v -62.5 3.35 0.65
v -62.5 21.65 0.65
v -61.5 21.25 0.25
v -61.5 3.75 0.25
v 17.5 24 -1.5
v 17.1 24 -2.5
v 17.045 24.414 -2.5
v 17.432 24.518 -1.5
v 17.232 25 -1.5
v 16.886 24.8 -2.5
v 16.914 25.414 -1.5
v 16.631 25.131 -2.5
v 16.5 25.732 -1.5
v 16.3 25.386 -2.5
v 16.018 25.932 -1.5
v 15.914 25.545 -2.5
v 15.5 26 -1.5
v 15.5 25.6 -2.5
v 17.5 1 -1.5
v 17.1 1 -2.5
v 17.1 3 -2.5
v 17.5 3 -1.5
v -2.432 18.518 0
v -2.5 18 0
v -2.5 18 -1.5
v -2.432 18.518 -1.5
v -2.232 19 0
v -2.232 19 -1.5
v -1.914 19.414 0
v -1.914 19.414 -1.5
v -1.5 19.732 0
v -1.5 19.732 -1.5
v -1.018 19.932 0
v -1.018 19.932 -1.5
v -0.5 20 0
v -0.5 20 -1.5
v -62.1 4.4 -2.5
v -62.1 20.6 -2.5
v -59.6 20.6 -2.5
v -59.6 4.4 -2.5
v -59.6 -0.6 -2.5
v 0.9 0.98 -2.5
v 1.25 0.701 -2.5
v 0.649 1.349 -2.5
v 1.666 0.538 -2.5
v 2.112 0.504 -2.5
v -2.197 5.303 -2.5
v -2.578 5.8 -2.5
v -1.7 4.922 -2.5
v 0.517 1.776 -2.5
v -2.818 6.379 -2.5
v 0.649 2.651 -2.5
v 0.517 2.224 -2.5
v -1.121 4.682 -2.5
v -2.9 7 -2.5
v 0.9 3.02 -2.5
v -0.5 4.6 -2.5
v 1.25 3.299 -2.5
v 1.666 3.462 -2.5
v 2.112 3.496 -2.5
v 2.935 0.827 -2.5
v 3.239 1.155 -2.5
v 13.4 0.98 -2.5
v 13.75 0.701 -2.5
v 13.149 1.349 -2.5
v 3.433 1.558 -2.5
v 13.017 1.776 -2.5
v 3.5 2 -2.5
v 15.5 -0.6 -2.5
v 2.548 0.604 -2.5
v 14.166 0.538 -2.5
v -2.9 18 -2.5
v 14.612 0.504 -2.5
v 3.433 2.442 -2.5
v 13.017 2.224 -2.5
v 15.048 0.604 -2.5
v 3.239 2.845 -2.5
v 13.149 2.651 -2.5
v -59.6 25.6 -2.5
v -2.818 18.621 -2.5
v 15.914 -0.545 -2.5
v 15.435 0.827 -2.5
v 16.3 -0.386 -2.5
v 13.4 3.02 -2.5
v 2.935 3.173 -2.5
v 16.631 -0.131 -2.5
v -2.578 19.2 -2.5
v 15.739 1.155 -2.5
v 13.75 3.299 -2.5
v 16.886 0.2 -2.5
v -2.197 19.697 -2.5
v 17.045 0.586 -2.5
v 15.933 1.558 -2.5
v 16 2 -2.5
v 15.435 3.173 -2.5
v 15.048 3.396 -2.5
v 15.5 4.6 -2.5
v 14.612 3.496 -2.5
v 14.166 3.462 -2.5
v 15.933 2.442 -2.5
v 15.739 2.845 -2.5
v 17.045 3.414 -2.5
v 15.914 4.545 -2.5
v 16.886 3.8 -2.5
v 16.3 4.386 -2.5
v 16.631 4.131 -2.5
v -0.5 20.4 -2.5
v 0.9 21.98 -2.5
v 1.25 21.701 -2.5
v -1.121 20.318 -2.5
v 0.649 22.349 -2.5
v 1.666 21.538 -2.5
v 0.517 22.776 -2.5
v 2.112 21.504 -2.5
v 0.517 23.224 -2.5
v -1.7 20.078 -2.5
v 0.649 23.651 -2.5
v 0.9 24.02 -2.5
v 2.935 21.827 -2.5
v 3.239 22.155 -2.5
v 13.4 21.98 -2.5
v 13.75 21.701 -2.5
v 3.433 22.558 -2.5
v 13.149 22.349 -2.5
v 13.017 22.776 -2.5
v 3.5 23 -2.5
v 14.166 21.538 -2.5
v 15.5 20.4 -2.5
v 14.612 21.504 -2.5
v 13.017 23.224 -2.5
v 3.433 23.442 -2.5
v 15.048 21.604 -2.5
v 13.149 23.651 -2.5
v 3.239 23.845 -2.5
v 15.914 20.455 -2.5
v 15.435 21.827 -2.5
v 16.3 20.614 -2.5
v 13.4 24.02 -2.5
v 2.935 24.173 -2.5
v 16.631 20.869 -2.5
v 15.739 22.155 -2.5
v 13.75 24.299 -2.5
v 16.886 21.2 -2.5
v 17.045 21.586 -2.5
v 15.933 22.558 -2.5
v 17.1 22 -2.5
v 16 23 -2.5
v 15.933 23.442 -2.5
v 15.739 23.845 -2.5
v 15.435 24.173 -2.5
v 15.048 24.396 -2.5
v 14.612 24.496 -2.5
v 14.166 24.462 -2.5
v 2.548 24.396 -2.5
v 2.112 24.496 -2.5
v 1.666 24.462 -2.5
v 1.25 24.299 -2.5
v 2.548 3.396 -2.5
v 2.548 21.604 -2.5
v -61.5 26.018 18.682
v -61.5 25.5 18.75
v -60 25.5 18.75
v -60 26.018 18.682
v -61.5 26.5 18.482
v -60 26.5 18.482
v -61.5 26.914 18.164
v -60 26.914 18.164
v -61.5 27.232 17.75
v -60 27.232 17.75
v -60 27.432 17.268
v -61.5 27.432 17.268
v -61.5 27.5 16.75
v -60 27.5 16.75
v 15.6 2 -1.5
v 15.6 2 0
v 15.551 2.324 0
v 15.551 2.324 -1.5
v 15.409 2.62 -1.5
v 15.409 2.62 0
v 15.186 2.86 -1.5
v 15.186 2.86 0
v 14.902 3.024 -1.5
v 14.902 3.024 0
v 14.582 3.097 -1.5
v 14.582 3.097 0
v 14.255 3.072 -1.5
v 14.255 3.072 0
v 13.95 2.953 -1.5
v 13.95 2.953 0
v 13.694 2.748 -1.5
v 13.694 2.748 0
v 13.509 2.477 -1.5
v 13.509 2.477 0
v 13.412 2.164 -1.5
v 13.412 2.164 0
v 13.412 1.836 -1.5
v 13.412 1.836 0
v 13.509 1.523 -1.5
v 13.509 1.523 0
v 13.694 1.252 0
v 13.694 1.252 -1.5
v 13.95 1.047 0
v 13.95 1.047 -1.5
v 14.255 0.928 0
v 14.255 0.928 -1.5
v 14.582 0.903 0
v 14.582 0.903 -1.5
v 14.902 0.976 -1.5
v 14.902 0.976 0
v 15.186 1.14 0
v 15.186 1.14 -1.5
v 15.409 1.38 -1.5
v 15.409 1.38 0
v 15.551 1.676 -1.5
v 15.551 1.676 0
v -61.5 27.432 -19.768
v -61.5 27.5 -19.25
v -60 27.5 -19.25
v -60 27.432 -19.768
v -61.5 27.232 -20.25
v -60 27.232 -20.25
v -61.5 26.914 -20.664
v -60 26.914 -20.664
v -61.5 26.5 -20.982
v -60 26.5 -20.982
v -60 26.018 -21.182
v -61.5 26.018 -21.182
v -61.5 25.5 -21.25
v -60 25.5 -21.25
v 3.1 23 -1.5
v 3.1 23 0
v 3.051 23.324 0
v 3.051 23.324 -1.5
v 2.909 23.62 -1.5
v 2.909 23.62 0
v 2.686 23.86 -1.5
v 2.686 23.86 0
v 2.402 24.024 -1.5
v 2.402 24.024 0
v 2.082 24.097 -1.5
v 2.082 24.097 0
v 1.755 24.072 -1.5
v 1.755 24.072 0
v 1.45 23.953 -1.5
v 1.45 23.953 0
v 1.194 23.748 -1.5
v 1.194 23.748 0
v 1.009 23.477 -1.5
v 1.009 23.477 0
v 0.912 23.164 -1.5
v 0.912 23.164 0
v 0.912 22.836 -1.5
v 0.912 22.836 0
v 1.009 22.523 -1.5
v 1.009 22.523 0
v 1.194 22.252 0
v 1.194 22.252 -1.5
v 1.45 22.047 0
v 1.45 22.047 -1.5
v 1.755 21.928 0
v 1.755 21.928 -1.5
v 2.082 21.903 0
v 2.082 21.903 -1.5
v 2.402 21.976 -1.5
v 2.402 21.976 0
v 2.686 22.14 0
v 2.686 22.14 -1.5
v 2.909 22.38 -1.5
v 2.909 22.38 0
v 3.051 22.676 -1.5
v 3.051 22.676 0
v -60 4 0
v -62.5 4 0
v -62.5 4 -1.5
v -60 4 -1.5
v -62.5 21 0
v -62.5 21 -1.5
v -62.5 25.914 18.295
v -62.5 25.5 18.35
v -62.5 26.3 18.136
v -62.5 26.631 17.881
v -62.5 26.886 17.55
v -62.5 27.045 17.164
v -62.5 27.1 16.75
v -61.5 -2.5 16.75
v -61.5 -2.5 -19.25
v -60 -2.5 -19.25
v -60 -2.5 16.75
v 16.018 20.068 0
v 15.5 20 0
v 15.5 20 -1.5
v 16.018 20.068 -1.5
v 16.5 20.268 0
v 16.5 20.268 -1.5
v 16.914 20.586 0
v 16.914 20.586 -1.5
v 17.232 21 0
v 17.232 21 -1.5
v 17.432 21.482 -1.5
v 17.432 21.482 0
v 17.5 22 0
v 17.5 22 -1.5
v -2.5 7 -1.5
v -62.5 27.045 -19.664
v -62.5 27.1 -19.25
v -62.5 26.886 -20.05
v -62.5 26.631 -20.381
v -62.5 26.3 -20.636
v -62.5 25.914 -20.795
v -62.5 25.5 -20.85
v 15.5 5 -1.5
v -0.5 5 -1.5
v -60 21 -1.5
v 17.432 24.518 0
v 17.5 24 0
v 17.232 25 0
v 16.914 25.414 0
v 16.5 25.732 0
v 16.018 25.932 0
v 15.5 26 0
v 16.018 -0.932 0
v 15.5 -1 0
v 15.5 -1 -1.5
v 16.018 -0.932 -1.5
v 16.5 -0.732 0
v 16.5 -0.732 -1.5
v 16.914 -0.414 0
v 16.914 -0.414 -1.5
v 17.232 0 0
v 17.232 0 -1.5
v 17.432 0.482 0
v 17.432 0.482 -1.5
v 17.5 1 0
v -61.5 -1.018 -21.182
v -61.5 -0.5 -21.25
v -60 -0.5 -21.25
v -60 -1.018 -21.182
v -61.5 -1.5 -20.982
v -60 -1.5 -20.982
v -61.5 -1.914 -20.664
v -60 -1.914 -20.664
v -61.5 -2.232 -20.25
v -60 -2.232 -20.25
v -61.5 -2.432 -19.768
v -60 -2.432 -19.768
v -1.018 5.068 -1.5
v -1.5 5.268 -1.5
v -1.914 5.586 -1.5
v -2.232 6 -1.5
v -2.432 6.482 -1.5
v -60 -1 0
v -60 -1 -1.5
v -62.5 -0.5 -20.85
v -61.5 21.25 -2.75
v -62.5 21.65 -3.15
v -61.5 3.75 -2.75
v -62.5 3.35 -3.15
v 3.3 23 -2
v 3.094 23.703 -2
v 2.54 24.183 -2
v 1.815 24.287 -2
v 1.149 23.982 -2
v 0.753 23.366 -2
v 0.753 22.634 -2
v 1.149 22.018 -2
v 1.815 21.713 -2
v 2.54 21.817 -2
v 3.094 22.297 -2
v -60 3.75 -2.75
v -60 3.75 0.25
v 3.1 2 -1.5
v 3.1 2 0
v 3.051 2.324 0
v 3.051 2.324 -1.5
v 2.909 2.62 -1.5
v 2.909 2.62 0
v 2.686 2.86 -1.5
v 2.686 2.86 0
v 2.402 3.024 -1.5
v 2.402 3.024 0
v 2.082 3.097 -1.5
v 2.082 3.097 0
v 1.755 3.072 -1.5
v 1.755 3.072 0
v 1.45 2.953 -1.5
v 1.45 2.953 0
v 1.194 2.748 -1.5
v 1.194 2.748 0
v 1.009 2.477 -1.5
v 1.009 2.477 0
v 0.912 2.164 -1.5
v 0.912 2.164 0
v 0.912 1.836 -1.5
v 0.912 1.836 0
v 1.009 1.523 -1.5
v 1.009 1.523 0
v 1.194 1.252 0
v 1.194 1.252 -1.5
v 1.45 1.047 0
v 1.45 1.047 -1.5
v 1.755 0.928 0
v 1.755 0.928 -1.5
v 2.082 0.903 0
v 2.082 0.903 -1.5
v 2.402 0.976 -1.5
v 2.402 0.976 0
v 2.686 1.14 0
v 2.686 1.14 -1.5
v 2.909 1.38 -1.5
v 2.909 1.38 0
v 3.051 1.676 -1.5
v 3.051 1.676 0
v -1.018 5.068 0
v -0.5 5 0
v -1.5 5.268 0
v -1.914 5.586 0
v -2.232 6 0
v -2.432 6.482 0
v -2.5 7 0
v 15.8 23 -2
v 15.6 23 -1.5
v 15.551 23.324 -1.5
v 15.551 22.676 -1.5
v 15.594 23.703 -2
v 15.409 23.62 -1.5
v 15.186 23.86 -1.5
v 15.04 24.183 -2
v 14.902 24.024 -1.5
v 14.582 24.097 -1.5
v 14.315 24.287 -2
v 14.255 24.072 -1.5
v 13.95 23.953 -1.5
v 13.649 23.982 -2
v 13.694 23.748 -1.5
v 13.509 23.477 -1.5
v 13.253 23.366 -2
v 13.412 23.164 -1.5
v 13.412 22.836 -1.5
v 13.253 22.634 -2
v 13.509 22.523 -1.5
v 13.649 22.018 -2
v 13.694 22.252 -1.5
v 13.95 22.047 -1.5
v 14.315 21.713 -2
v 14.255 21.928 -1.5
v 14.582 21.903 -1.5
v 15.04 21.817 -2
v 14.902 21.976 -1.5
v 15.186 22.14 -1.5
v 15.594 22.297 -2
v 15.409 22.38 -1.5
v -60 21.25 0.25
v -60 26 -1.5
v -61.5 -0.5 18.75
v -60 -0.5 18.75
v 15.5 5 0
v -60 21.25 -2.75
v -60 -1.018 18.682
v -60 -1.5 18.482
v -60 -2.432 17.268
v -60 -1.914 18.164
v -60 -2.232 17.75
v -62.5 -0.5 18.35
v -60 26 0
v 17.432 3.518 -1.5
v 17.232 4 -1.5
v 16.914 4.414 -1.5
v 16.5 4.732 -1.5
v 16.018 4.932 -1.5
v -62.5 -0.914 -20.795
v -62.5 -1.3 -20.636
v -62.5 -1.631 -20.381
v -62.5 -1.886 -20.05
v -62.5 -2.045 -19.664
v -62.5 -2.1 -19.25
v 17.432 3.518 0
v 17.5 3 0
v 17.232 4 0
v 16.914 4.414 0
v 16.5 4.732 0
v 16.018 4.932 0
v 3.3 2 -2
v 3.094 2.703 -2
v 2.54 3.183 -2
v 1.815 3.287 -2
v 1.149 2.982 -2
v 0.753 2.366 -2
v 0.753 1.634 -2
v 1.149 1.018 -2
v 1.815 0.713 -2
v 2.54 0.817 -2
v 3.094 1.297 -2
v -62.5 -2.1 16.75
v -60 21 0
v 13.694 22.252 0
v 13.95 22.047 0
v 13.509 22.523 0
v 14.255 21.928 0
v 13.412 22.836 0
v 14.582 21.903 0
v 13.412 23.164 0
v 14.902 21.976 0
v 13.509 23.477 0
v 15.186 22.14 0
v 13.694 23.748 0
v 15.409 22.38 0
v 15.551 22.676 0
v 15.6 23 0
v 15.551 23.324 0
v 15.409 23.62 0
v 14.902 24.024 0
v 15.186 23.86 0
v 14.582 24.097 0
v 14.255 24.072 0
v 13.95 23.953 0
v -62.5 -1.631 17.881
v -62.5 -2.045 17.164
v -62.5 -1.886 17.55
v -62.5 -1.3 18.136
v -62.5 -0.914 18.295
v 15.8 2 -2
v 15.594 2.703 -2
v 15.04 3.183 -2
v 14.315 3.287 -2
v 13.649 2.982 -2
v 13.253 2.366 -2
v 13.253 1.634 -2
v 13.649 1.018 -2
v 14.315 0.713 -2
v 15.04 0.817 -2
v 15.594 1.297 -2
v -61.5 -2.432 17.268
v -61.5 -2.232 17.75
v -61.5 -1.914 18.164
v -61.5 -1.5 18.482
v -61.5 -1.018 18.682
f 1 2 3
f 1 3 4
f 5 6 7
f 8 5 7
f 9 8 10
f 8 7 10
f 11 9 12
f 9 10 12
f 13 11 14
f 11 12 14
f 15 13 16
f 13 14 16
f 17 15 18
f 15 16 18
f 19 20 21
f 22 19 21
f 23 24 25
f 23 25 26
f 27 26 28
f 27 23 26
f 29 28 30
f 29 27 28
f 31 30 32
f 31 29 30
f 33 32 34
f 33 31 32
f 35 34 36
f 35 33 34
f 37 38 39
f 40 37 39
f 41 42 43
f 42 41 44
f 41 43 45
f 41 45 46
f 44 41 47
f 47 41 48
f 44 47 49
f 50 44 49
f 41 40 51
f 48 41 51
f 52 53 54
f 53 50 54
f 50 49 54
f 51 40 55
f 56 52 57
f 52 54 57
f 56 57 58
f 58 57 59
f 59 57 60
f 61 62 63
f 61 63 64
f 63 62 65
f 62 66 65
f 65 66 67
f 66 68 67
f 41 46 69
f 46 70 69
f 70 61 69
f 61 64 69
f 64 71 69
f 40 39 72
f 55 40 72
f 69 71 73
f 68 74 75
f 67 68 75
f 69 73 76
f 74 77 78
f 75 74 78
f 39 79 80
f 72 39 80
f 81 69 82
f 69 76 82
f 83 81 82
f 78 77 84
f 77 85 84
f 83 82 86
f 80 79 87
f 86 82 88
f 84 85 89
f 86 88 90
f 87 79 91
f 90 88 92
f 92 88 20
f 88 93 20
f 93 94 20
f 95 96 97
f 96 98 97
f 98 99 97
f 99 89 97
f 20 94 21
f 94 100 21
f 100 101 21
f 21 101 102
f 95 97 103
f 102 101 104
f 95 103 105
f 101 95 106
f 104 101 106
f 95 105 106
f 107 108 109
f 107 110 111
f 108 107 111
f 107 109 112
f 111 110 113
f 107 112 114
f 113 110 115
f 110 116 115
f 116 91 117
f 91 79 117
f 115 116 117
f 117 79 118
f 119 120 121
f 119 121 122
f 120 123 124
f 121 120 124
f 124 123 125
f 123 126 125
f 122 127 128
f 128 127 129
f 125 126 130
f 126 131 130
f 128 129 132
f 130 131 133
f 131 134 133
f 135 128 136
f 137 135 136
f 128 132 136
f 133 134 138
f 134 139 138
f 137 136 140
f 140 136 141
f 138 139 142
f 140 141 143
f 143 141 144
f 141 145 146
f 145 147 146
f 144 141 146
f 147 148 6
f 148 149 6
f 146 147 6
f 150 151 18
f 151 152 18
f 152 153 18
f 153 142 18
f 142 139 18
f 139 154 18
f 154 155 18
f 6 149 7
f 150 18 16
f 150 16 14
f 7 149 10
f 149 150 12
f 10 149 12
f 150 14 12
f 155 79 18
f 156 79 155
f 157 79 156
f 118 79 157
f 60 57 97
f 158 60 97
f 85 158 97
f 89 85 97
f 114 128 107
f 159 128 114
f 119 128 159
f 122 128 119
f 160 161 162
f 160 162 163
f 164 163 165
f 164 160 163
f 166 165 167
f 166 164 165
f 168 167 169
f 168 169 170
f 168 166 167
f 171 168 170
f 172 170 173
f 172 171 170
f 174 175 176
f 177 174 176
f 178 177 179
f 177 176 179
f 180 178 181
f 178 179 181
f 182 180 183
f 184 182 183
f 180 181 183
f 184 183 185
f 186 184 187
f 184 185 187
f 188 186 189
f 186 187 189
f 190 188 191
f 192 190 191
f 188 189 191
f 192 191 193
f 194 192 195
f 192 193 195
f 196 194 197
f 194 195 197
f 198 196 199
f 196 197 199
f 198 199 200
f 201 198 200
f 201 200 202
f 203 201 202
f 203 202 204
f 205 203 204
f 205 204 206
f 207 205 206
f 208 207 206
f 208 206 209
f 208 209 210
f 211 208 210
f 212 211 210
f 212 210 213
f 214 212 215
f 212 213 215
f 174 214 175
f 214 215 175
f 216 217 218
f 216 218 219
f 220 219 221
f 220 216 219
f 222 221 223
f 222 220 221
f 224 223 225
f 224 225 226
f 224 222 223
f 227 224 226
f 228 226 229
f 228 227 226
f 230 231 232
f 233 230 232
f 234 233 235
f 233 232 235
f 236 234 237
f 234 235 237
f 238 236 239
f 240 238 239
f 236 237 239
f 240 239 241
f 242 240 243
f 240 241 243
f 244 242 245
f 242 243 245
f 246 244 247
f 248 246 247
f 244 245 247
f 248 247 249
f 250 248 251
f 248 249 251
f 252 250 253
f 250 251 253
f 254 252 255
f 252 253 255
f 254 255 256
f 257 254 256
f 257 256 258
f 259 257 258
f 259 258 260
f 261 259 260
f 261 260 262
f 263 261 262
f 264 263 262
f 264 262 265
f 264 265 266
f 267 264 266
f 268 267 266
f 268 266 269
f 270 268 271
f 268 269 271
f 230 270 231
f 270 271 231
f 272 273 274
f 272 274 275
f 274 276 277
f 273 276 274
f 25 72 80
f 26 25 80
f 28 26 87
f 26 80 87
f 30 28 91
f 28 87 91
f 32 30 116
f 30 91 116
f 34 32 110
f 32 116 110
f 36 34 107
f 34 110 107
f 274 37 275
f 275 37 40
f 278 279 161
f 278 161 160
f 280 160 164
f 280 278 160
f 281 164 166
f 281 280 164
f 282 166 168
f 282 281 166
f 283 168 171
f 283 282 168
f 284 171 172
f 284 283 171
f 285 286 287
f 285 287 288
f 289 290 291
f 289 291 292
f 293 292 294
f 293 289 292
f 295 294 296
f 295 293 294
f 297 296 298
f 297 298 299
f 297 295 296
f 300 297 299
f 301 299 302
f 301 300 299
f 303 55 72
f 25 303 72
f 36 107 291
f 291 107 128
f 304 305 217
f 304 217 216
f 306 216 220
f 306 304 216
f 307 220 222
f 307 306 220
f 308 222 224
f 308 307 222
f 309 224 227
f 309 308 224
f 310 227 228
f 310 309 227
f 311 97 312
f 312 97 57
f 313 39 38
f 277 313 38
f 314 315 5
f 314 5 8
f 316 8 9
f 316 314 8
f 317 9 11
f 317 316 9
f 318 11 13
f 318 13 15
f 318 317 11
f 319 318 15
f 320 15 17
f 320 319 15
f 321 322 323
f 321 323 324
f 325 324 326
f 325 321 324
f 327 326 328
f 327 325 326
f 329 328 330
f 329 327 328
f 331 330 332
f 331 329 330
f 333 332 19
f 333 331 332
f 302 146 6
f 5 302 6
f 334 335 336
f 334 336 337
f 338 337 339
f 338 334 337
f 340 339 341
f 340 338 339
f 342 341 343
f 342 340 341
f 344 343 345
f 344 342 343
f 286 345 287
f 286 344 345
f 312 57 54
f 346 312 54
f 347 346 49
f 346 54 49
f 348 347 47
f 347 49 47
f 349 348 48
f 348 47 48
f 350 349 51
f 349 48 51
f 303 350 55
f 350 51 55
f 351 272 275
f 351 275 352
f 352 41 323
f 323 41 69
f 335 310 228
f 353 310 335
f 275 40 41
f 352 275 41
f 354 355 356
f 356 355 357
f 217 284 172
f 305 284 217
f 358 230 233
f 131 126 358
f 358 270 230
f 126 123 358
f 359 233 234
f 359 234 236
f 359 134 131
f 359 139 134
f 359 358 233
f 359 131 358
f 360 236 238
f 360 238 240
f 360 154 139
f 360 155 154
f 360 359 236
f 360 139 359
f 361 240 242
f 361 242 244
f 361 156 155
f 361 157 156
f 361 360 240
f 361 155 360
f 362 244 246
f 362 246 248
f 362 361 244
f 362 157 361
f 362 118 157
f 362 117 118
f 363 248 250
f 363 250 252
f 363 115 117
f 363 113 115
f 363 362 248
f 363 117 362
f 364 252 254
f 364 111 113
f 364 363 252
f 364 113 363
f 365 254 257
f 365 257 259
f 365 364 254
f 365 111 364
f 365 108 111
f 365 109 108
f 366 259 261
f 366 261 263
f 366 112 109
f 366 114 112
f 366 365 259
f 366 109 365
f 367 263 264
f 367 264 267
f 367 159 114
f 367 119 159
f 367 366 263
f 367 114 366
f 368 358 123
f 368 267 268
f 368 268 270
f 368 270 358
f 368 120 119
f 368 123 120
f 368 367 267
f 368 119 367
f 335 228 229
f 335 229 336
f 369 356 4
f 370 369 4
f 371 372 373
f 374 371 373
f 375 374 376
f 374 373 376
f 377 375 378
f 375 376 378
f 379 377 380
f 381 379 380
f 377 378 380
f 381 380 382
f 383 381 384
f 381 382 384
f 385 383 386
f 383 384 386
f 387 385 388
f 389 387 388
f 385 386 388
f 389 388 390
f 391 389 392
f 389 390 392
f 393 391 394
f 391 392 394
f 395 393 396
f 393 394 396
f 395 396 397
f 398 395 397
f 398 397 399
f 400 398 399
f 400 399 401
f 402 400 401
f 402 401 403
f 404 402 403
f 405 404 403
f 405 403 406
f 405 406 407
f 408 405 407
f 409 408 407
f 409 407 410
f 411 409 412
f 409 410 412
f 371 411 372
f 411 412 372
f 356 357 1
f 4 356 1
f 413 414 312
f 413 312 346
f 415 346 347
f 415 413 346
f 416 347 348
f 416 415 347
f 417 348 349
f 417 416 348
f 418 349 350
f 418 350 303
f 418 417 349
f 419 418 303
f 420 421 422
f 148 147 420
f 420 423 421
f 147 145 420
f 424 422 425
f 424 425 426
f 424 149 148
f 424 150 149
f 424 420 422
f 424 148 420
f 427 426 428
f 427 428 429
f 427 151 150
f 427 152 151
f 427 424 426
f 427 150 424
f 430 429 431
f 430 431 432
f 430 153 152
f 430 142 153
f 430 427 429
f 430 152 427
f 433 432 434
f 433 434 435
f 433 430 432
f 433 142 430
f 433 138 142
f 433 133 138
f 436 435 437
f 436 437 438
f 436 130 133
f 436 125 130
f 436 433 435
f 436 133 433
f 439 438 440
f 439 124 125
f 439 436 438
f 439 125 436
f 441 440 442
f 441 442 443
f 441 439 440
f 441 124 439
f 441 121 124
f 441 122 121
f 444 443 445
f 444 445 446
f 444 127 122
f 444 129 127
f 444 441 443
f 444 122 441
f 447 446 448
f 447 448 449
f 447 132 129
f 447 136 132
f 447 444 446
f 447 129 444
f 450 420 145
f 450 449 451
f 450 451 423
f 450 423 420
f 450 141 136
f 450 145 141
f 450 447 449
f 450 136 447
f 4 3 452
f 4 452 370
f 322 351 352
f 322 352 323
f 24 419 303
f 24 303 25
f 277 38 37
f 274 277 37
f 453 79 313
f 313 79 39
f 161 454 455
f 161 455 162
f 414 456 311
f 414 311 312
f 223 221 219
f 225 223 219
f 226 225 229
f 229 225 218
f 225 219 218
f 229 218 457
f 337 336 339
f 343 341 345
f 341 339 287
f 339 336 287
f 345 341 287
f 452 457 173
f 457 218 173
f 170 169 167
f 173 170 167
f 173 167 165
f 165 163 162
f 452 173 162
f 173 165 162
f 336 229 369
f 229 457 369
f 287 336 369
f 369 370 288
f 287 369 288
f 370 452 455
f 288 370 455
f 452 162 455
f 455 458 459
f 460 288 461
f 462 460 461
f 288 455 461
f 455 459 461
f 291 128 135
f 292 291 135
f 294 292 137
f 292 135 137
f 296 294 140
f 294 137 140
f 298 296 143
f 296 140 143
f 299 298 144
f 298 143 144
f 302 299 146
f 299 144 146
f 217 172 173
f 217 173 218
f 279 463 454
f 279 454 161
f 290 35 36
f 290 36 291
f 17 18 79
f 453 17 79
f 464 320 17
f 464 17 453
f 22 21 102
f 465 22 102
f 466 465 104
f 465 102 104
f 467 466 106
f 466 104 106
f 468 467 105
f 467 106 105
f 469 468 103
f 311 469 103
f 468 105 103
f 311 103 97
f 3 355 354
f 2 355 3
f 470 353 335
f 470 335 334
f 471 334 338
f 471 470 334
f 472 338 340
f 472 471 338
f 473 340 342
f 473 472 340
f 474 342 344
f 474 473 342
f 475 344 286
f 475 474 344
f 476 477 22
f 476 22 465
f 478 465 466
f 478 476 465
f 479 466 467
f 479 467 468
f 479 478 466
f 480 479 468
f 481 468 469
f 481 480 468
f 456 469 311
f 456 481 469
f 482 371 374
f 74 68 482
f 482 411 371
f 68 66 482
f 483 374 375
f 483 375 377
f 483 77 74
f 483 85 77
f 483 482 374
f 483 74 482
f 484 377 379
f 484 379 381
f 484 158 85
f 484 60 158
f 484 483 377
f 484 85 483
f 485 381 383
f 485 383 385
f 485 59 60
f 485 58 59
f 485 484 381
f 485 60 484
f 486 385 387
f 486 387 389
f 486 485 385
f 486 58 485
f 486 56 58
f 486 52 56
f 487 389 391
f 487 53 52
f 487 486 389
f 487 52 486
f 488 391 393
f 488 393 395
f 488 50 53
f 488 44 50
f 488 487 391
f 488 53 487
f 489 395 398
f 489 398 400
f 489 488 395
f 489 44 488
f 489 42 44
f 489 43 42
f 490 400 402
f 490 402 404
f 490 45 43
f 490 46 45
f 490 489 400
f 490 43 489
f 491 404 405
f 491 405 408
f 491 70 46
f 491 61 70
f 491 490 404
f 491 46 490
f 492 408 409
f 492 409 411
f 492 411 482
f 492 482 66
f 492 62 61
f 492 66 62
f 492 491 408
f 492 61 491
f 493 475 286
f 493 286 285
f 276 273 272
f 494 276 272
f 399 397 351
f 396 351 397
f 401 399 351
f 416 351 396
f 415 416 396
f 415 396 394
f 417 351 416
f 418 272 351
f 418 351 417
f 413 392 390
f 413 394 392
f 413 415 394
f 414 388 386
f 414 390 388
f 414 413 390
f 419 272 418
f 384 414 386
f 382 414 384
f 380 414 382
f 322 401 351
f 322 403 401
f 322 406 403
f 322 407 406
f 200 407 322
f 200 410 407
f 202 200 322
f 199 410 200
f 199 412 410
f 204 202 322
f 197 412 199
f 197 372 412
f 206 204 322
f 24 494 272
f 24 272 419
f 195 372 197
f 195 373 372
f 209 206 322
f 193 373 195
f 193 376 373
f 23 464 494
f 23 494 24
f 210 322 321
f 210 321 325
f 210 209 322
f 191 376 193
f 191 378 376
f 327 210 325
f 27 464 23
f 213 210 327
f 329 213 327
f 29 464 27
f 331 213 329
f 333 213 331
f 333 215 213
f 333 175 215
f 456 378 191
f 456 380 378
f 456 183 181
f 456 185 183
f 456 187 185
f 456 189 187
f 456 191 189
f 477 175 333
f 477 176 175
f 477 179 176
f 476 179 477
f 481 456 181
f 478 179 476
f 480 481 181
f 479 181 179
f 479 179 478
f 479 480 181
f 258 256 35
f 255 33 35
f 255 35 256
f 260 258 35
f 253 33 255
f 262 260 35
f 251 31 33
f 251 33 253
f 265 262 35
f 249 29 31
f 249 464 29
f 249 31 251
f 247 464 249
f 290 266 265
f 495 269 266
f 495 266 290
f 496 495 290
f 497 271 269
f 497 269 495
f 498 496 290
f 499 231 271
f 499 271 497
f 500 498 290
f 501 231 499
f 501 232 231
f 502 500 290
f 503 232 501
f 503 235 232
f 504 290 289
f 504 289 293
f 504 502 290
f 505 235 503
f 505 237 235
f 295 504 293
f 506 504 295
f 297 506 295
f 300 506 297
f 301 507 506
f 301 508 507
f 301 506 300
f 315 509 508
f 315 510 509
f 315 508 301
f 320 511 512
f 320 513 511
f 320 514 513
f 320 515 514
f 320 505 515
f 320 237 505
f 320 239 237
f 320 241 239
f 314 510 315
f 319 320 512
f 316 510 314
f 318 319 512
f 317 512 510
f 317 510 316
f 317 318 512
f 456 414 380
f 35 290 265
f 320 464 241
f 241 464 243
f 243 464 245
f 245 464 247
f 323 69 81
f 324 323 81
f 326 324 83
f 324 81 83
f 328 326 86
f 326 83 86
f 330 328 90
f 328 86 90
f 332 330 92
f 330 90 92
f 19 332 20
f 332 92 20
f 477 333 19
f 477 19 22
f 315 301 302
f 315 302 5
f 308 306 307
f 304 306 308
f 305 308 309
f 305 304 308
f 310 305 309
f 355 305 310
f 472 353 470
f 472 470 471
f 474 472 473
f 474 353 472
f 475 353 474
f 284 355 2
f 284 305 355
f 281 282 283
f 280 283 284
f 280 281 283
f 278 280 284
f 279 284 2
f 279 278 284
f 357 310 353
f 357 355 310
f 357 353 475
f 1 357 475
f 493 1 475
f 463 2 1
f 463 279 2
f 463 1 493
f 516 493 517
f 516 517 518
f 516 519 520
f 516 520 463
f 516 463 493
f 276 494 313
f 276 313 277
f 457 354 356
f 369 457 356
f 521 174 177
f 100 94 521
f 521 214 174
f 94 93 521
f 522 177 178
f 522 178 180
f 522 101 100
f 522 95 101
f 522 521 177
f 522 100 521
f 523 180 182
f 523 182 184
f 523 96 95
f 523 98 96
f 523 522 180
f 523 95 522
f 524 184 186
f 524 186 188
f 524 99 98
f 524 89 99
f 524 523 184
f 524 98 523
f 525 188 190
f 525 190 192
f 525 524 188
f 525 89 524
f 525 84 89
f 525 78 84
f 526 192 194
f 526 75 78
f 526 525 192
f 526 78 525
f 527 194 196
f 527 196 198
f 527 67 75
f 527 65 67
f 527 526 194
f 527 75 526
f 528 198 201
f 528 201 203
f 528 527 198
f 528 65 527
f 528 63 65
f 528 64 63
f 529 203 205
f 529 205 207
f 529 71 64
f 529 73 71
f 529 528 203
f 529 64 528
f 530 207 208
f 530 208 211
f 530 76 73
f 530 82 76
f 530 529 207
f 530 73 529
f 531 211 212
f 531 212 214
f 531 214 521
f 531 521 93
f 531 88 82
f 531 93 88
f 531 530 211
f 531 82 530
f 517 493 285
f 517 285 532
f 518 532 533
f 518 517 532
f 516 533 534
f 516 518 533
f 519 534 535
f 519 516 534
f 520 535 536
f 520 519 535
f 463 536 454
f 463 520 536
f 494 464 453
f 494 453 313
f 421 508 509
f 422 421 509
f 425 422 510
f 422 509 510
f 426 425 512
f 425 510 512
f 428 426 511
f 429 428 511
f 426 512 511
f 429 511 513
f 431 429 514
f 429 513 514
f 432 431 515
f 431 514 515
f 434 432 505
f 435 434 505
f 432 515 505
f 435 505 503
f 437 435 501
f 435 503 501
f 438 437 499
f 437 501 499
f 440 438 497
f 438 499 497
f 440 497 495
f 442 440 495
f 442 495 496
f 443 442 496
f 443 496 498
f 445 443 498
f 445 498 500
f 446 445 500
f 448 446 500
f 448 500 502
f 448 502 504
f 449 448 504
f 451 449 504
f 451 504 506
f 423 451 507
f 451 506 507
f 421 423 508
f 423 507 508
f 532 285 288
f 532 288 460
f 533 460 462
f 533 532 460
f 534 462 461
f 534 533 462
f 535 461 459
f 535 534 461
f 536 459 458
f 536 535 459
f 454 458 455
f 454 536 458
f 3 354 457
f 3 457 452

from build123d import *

# Parameters (mm, degrees)
F0_R     = 1.1
F1_DEPTH = 2.5
F2_W     = 17.5
F2_H     = 3
F3_DEPTH = 2.5
F4_SIZE2 = 0.4
F4_SIZE  = 1
F5_SIZE2 = 0.4
F5_SIZE  = 1


with BuildPart() as f1:
    # F0 (on Top) → F1 (new body)
    with BuildSketch(Plane.XY):
        with BuildLine():
            Line((-60, 4), (-60, -1))
            Line((-60, -1), (15.5, -1))
            ThreePointArc((15.5, -1), (16.914214, -0.414214), (17.5, 1))
            Line((17.5, 1), (17.5, 3))
            ThreePointArc((17.5, 3), (16.914214, 4.414214), (15.5, 5))
            Line((15.5, 5), (-0.5, 5))
            ThreePointArc((-0.5, 5), (-1.914214, 5.585786), (-2.5, 7))
            Line((-2.5, 7), (-2.5, 18))
            ThreePointArc((-2.5, 18), (-1.914214, 19.414214), (-0.5, 20))
            Line((-0.5, 20), (15.5, 20))
            ThreePointArc((15.5, 20), (16.914214, 20.585786), (17.5, 22))
            Line((17.5, 22), (17.5, 24))
            ThreePointArc((17.5, 24), (16.914214, 25.414214), (15.5, 26))
            Line((15.5, 26), (-60, 26))
            Line((-60, 26), (-60, 21))
            Line((-60, 21), (-62.5, 21))
            Line((-62.5, 21), (-62.5, 4))
            Line((-62.5, 4), (-60, 4))
        make_face()
        with Locations((2, 2)):
            Circle(F0_R, mode=Mode.SUBTRACT)
        with Locations((14.5, 2)):
            Circle(F0_R, mode=Mode.SUBTRACT)
        with Locations((2, 23)):
            Circle(F0_R, mode=Mode.SUBTRACT)
        with Locations((14.5, 23)):
            Circle(F0_R, mode=Mode.SUBTRACT)
    extrude(amount=-F1_DEPTH)

    # F5
    f5_edges = [f1.edges().sort_by_distance(p)[0] for p in [
        (-61.25, 21, -2.5),
        (-62.5, 12.5, -2.5),
        (-61.25, 4, -2.5),
        (-60, 1.5, -2.5),
        (-22.25, -1, -2.5),
        (16.914214, -0.414214, -2.5),
        (17.5, 2, -2.5),
        (16.914214, 4.414214, -2.5),
        (7.5, 5, -2.5),
        (-1.914214, 5.585786, -2.5),
        (-2.5, 12.5, -2.5),
        (-1.914214, 19.414214, -2.5),
        (7.5, 20, -2.5),
        (16.914214, 20.585786, -2.5),
        (17.5, 23, -2.5),
        (16.914214, 25.414214, -2.5),
        (-22.25, 26, -2.5),
        (-60, 23.5, -2.5),
        (0.9, 2, -2.5),
        (13.4, 2, -2.5),
        (0.9, 23, -2.5),
        (13.4, 23, -2.5),
    ]]
    chamfer(f5_edges, length=F5_SIZE, length2=F5_SIZE2)


with BuildPart() as f3:
    # F2 (on face) → F3 (new body, through all)
    with BuildSketch(Plane(origin=(-62.5, 0, 0), x_dir=(0, -1, 0), z_dir=(-1, 0, 0))):
        with BuildLine():
            Line((0.5, 18.75), (-25.5, 18.75))
            ThreePointArc((-25.5, 18.75), (-26.914214, 18.164214), (-27.5, 16.75))
            Line((-27.5, 16.75), (-27.5, -19.25))
            ThreePointArc((-27.5, -19.25), (-26.914214, -20.664214), (-25.5, -21.25))
            Line((-25.5, -21.25), (0.5, -21.25))
            ThreePointArc((0.5, -21.25), (1.914214, -20.664214), (2.5, -19.25))
            Line((2.5, -19.25), (2.5, 16.75))
            ThreePointArc((2.5, 16.75), (1.914214, 18.164214), (0.5, 18.75))
        make_face()
        with Locations((-12.5, -1.25)):
            Rectangle(F2_W, F2_H, mode=Mode.SUBTRACT)
    extrude(amount=-F3_DEPTH)

    # F4
    f4_edges = [f3.edges().sort_by_distance(p)[0] for p in [
        (-62.5, -1.914214, 18.164214),
        (-62.5, 12.5, 18.75),
        (-62.5, 26.914214, 18.164214),
        (-62.5, 27.5, -1.25),
        (-62.5, 26.914214, -20.664214),
        (-62.5, 12.5, -21.25),
        (-62.5, -1.914214, -20.664214),
        (-62.5, -2.5, -1.25),
        (-62.5, 12.5, 0.25),
        (-62.5, 3.75, -1.25),
        (-62.5, 12.5, -2.75),
        (-62.5, 21.25, -1.25),
    ]]
    chamfer(f4_edges, length=F4_SIZE, length2=F4_SIZE2)


solid = Compound([f1.part, f3.part])
